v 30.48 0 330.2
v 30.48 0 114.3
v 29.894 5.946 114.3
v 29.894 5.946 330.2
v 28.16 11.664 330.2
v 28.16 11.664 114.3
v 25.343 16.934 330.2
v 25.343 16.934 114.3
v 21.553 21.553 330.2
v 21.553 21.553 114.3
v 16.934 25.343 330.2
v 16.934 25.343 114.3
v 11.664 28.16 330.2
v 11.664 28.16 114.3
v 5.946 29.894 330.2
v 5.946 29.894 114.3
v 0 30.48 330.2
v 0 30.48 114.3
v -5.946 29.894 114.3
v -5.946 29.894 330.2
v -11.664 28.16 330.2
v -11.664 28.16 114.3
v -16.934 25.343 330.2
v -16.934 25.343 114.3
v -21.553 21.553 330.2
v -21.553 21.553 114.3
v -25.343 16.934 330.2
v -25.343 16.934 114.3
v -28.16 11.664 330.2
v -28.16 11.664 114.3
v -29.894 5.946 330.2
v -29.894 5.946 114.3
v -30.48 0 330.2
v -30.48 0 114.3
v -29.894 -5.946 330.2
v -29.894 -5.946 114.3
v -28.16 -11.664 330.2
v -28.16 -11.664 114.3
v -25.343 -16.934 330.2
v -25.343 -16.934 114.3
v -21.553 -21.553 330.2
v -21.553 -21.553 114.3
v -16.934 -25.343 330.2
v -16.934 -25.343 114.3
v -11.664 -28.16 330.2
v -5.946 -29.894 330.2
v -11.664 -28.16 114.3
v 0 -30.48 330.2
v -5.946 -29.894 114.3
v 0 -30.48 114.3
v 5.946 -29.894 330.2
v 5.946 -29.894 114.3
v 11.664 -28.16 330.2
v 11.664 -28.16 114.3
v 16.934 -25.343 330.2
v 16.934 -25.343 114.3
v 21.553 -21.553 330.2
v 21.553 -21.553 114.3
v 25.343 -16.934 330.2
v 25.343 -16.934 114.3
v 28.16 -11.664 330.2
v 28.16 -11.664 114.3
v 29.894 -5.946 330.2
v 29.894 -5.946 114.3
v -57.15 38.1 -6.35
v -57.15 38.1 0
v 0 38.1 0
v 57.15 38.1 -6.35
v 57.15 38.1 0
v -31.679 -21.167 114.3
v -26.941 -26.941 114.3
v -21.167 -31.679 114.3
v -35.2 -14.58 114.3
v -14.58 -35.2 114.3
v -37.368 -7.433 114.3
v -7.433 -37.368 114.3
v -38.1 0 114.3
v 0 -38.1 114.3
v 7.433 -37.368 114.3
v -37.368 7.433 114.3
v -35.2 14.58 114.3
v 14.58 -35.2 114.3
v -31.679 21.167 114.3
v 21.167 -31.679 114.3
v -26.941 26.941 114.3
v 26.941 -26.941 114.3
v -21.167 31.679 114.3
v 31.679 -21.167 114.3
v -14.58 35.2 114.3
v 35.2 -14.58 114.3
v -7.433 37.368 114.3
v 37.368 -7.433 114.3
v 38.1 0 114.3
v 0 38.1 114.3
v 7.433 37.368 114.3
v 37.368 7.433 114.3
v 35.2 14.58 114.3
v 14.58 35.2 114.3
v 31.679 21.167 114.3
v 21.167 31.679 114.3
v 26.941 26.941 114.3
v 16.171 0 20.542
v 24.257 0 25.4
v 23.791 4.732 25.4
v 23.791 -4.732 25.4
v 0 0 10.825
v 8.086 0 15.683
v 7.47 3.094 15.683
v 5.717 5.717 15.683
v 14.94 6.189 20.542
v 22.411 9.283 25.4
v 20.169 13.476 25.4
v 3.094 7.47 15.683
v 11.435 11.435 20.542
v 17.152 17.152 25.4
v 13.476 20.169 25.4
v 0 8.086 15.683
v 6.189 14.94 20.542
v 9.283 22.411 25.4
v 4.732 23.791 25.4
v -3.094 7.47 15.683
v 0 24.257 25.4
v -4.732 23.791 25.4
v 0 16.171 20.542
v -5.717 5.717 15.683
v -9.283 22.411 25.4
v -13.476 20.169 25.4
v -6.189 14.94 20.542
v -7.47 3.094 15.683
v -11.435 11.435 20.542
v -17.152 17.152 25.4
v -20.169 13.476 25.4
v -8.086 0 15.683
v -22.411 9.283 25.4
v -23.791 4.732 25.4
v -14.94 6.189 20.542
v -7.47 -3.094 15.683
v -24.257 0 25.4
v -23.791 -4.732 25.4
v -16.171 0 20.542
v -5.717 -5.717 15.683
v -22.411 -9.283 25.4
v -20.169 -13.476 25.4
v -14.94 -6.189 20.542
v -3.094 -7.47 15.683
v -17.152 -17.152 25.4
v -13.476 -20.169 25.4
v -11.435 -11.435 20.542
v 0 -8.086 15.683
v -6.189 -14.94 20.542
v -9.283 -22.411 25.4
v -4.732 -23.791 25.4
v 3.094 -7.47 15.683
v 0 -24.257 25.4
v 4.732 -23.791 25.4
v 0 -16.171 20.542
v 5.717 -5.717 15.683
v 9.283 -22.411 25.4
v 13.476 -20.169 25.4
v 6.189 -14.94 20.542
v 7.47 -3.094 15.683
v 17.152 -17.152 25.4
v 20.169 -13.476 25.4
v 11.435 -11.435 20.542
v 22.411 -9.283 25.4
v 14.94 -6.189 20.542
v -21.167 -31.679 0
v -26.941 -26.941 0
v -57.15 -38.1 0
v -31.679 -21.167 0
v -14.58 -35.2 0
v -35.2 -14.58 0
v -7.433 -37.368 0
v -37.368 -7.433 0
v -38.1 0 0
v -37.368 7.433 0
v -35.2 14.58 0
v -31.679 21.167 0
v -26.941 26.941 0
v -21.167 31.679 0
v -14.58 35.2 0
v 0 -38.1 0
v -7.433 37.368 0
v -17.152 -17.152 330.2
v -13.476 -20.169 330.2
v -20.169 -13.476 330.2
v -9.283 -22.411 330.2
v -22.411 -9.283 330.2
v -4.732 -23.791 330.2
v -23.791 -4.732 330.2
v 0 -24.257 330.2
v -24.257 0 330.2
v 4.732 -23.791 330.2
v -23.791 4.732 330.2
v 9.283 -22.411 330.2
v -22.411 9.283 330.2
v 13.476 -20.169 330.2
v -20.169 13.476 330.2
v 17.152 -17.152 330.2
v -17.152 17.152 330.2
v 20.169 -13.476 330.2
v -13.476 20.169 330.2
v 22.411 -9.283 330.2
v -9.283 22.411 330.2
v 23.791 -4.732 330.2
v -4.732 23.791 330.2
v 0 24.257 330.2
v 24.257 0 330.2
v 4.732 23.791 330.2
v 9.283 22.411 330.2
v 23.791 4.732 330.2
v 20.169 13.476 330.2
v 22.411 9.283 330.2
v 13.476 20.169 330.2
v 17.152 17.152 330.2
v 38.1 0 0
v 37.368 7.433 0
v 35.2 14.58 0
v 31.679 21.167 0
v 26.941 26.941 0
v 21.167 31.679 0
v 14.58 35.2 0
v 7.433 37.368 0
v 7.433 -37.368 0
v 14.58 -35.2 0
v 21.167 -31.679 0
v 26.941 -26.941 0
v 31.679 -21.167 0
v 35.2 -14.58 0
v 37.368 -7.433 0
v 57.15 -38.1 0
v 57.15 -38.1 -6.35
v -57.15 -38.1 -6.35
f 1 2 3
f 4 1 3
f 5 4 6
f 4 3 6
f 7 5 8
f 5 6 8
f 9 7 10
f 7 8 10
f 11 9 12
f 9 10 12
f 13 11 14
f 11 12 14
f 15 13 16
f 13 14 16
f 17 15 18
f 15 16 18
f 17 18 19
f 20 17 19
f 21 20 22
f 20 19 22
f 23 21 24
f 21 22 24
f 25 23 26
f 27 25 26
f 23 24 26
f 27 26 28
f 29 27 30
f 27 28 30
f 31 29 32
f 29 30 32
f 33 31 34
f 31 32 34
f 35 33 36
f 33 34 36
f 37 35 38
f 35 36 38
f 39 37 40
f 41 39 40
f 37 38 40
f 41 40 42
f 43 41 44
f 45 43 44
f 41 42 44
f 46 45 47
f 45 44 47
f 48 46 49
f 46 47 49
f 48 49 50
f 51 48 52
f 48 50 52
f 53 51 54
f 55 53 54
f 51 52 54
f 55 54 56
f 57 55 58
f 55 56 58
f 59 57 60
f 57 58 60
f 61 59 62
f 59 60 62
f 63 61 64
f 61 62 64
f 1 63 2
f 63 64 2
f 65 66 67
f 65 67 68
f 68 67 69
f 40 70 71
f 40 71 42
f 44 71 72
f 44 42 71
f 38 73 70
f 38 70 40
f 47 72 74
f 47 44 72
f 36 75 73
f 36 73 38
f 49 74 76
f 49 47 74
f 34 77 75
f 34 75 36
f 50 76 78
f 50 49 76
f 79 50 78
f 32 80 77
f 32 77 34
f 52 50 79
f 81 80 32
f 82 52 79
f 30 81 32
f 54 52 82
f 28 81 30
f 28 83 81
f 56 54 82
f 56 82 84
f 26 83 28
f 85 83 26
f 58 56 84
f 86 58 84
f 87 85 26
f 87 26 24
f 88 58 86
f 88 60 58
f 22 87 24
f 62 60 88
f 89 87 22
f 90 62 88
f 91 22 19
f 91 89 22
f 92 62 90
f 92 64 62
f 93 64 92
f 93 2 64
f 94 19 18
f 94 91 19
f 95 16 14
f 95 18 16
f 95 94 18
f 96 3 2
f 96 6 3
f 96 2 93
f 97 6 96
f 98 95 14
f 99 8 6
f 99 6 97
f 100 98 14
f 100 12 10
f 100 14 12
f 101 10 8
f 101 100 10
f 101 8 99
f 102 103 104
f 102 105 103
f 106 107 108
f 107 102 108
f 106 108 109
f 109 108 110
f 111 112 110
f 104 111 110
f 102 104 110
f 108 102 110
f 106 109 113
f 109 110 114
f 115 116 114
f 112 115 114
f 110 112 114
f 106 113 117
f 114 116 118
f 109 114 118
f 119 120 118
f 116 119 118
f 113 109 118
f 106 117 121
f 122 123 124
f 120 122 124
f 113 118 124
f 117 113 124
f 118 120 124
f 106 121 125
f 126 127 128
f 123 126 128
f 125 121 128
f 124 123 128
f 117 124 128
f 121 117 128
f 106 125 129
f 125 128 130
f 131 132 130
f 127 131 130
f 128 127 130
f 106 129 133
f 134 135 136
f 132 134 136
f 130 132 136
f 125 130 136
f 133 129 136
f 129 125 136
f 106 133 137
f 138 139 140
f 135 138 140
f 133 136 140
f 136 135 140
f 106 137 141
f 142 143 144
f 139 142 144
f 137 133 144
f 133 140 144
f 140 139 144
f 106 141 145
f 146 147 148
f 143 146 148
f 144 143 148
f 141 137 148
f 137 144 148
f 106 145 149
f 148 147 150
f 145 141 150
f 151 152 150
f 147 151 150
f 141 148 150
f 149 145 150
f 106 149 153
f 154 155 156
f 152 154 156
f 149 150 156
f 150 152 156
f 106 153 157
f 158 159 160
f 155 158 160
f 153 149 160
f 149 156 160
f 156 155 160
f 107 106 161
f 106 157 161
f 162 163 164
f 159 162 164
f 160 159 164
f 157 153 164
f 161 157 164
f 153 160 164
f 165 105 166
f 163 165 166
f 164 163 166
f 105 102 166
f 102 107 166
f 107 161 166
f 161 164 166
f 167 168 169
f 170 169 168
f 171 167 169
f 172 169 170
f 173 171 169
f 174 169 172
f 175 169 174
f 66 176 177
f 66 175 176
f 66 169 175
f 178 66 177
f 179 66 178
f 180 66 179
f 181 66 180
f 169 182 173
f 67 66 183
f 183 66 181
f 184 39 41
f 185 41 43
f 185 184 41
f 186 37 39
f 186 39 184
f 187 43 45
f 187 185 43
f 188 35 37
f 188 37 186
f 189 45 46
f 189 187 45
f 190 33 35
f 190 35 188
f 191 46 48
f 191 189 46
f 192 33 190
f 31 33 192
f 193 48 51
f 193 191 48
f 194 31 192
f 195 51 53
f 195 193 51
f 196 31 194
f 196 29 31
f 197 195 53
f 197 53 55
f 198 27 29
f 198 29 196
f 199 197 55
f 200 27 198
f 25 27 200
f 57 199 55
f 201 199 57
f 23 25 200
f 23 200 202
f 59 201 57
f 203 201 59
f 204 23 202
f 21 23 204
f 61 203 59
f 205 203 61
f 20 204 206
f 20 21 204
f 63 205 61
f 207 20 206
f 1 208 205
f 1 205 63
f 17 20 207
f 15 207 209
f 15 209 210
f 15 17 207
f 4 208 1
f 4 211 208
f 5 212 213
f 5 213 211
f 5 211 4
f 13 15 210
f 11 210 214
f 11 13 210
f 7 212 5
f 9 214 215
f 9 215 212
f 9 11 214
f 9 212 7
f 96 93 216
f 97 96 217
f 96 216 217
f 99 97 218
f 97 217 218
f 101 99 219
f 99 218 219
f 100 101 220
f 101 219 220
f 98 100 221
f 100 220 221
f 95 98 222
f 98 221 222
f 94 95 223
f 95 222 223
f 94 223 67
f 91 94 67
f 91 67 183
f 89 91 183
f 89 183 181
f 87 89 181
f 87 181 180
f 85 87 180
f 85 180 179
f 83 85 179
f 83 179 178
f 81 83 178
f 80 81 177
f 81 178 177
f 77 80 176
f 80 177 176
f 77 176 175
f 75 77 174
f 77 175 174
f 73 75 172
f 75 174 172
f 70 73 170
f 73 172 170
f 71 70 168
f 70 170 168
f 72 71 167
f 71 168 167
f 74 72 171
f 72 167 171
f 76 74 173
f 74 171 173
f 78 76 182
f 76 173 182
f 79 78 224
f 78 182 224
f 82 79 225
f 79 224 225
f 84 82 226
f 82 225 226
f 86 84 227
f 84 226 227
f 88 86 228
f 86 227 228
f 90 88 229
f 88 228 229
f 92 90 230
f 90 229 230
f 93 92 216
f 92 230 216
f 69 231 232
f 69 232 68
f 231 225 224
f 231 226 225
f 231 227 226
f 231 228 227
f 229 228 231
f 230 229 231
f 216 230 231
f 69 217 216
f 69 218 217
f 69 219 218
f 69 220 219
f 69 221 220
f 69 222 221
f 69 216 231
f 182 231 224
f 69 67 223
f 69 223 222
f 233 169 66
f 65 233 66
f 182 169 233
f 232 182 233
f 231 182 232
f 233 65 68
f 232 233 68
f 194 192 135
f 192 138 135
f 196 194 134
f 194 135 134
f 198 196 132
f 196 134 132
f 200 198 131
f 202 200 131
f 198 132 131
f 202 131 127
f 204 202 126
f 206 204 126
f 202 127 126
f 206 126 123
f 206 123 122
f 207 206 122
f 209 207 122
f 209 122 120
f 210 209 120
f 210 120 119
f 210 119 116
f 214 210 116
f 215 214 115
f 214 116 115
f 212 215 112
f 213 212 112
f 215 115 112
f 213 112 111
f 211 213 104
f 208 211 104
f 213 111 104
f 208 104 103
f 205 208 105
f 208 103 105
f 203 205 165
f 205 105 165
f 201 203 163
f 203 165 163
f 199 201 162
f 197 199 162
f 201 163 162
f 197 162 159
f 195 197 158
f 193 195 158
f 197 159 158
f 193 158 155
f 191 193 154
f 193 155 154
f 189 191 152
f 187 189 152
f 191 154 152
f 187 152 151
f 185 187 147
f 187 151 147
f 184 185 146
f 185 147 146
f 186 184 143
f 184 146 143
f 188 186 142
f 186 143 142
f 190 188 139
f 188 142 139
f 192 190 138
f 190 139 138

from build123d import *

# Parameters (mm, degrees)
F0_R     = 38.1
F1_DEPTH = 114.3
F2_R     = 30.48
F3_DEPTH = 215.9
F5_D     = 48.514
F5_DEPTH = 304.8
F5_TIP   = 14.5750760358
F6_W     = 114.3
F6_H     = 76.2
F7_DEPTH = 6.35


with BuildPart() as f1:
    # F0 (on Top) → F1 (new body)
    with BuildSketch(Plane.XY):
        Circle(F0_R)
    extrude(amount=F1_DEPTH)

    # F2 (on face) → F3 (join)
    with BuildSketch(Plane.XY.offset(114.3)):
        Circle(F2_R)
    extrude(amount=F3_DEPTH)

    # F5
    with Locations(Plane.XY.offset(330.2)):
        with Locations((0, 0)):
            Hole(F5_D / 2, depth=F5_DEPTH)
            with Locations((0, 0, -(F5_DEPTH + F5_TIP / 2))):  # 118° drill point
                Cone(0, F5_D / 2, F5_TIP, mode=Mode.SUBTRACT)

    # F6 (on Top) → F7 (join)
    with BuildSketch(Plane.XY):
        Rectangle(F6_W, F6_H)
    extrude(amount=-F7_DEPTH)


solid = f1.part
